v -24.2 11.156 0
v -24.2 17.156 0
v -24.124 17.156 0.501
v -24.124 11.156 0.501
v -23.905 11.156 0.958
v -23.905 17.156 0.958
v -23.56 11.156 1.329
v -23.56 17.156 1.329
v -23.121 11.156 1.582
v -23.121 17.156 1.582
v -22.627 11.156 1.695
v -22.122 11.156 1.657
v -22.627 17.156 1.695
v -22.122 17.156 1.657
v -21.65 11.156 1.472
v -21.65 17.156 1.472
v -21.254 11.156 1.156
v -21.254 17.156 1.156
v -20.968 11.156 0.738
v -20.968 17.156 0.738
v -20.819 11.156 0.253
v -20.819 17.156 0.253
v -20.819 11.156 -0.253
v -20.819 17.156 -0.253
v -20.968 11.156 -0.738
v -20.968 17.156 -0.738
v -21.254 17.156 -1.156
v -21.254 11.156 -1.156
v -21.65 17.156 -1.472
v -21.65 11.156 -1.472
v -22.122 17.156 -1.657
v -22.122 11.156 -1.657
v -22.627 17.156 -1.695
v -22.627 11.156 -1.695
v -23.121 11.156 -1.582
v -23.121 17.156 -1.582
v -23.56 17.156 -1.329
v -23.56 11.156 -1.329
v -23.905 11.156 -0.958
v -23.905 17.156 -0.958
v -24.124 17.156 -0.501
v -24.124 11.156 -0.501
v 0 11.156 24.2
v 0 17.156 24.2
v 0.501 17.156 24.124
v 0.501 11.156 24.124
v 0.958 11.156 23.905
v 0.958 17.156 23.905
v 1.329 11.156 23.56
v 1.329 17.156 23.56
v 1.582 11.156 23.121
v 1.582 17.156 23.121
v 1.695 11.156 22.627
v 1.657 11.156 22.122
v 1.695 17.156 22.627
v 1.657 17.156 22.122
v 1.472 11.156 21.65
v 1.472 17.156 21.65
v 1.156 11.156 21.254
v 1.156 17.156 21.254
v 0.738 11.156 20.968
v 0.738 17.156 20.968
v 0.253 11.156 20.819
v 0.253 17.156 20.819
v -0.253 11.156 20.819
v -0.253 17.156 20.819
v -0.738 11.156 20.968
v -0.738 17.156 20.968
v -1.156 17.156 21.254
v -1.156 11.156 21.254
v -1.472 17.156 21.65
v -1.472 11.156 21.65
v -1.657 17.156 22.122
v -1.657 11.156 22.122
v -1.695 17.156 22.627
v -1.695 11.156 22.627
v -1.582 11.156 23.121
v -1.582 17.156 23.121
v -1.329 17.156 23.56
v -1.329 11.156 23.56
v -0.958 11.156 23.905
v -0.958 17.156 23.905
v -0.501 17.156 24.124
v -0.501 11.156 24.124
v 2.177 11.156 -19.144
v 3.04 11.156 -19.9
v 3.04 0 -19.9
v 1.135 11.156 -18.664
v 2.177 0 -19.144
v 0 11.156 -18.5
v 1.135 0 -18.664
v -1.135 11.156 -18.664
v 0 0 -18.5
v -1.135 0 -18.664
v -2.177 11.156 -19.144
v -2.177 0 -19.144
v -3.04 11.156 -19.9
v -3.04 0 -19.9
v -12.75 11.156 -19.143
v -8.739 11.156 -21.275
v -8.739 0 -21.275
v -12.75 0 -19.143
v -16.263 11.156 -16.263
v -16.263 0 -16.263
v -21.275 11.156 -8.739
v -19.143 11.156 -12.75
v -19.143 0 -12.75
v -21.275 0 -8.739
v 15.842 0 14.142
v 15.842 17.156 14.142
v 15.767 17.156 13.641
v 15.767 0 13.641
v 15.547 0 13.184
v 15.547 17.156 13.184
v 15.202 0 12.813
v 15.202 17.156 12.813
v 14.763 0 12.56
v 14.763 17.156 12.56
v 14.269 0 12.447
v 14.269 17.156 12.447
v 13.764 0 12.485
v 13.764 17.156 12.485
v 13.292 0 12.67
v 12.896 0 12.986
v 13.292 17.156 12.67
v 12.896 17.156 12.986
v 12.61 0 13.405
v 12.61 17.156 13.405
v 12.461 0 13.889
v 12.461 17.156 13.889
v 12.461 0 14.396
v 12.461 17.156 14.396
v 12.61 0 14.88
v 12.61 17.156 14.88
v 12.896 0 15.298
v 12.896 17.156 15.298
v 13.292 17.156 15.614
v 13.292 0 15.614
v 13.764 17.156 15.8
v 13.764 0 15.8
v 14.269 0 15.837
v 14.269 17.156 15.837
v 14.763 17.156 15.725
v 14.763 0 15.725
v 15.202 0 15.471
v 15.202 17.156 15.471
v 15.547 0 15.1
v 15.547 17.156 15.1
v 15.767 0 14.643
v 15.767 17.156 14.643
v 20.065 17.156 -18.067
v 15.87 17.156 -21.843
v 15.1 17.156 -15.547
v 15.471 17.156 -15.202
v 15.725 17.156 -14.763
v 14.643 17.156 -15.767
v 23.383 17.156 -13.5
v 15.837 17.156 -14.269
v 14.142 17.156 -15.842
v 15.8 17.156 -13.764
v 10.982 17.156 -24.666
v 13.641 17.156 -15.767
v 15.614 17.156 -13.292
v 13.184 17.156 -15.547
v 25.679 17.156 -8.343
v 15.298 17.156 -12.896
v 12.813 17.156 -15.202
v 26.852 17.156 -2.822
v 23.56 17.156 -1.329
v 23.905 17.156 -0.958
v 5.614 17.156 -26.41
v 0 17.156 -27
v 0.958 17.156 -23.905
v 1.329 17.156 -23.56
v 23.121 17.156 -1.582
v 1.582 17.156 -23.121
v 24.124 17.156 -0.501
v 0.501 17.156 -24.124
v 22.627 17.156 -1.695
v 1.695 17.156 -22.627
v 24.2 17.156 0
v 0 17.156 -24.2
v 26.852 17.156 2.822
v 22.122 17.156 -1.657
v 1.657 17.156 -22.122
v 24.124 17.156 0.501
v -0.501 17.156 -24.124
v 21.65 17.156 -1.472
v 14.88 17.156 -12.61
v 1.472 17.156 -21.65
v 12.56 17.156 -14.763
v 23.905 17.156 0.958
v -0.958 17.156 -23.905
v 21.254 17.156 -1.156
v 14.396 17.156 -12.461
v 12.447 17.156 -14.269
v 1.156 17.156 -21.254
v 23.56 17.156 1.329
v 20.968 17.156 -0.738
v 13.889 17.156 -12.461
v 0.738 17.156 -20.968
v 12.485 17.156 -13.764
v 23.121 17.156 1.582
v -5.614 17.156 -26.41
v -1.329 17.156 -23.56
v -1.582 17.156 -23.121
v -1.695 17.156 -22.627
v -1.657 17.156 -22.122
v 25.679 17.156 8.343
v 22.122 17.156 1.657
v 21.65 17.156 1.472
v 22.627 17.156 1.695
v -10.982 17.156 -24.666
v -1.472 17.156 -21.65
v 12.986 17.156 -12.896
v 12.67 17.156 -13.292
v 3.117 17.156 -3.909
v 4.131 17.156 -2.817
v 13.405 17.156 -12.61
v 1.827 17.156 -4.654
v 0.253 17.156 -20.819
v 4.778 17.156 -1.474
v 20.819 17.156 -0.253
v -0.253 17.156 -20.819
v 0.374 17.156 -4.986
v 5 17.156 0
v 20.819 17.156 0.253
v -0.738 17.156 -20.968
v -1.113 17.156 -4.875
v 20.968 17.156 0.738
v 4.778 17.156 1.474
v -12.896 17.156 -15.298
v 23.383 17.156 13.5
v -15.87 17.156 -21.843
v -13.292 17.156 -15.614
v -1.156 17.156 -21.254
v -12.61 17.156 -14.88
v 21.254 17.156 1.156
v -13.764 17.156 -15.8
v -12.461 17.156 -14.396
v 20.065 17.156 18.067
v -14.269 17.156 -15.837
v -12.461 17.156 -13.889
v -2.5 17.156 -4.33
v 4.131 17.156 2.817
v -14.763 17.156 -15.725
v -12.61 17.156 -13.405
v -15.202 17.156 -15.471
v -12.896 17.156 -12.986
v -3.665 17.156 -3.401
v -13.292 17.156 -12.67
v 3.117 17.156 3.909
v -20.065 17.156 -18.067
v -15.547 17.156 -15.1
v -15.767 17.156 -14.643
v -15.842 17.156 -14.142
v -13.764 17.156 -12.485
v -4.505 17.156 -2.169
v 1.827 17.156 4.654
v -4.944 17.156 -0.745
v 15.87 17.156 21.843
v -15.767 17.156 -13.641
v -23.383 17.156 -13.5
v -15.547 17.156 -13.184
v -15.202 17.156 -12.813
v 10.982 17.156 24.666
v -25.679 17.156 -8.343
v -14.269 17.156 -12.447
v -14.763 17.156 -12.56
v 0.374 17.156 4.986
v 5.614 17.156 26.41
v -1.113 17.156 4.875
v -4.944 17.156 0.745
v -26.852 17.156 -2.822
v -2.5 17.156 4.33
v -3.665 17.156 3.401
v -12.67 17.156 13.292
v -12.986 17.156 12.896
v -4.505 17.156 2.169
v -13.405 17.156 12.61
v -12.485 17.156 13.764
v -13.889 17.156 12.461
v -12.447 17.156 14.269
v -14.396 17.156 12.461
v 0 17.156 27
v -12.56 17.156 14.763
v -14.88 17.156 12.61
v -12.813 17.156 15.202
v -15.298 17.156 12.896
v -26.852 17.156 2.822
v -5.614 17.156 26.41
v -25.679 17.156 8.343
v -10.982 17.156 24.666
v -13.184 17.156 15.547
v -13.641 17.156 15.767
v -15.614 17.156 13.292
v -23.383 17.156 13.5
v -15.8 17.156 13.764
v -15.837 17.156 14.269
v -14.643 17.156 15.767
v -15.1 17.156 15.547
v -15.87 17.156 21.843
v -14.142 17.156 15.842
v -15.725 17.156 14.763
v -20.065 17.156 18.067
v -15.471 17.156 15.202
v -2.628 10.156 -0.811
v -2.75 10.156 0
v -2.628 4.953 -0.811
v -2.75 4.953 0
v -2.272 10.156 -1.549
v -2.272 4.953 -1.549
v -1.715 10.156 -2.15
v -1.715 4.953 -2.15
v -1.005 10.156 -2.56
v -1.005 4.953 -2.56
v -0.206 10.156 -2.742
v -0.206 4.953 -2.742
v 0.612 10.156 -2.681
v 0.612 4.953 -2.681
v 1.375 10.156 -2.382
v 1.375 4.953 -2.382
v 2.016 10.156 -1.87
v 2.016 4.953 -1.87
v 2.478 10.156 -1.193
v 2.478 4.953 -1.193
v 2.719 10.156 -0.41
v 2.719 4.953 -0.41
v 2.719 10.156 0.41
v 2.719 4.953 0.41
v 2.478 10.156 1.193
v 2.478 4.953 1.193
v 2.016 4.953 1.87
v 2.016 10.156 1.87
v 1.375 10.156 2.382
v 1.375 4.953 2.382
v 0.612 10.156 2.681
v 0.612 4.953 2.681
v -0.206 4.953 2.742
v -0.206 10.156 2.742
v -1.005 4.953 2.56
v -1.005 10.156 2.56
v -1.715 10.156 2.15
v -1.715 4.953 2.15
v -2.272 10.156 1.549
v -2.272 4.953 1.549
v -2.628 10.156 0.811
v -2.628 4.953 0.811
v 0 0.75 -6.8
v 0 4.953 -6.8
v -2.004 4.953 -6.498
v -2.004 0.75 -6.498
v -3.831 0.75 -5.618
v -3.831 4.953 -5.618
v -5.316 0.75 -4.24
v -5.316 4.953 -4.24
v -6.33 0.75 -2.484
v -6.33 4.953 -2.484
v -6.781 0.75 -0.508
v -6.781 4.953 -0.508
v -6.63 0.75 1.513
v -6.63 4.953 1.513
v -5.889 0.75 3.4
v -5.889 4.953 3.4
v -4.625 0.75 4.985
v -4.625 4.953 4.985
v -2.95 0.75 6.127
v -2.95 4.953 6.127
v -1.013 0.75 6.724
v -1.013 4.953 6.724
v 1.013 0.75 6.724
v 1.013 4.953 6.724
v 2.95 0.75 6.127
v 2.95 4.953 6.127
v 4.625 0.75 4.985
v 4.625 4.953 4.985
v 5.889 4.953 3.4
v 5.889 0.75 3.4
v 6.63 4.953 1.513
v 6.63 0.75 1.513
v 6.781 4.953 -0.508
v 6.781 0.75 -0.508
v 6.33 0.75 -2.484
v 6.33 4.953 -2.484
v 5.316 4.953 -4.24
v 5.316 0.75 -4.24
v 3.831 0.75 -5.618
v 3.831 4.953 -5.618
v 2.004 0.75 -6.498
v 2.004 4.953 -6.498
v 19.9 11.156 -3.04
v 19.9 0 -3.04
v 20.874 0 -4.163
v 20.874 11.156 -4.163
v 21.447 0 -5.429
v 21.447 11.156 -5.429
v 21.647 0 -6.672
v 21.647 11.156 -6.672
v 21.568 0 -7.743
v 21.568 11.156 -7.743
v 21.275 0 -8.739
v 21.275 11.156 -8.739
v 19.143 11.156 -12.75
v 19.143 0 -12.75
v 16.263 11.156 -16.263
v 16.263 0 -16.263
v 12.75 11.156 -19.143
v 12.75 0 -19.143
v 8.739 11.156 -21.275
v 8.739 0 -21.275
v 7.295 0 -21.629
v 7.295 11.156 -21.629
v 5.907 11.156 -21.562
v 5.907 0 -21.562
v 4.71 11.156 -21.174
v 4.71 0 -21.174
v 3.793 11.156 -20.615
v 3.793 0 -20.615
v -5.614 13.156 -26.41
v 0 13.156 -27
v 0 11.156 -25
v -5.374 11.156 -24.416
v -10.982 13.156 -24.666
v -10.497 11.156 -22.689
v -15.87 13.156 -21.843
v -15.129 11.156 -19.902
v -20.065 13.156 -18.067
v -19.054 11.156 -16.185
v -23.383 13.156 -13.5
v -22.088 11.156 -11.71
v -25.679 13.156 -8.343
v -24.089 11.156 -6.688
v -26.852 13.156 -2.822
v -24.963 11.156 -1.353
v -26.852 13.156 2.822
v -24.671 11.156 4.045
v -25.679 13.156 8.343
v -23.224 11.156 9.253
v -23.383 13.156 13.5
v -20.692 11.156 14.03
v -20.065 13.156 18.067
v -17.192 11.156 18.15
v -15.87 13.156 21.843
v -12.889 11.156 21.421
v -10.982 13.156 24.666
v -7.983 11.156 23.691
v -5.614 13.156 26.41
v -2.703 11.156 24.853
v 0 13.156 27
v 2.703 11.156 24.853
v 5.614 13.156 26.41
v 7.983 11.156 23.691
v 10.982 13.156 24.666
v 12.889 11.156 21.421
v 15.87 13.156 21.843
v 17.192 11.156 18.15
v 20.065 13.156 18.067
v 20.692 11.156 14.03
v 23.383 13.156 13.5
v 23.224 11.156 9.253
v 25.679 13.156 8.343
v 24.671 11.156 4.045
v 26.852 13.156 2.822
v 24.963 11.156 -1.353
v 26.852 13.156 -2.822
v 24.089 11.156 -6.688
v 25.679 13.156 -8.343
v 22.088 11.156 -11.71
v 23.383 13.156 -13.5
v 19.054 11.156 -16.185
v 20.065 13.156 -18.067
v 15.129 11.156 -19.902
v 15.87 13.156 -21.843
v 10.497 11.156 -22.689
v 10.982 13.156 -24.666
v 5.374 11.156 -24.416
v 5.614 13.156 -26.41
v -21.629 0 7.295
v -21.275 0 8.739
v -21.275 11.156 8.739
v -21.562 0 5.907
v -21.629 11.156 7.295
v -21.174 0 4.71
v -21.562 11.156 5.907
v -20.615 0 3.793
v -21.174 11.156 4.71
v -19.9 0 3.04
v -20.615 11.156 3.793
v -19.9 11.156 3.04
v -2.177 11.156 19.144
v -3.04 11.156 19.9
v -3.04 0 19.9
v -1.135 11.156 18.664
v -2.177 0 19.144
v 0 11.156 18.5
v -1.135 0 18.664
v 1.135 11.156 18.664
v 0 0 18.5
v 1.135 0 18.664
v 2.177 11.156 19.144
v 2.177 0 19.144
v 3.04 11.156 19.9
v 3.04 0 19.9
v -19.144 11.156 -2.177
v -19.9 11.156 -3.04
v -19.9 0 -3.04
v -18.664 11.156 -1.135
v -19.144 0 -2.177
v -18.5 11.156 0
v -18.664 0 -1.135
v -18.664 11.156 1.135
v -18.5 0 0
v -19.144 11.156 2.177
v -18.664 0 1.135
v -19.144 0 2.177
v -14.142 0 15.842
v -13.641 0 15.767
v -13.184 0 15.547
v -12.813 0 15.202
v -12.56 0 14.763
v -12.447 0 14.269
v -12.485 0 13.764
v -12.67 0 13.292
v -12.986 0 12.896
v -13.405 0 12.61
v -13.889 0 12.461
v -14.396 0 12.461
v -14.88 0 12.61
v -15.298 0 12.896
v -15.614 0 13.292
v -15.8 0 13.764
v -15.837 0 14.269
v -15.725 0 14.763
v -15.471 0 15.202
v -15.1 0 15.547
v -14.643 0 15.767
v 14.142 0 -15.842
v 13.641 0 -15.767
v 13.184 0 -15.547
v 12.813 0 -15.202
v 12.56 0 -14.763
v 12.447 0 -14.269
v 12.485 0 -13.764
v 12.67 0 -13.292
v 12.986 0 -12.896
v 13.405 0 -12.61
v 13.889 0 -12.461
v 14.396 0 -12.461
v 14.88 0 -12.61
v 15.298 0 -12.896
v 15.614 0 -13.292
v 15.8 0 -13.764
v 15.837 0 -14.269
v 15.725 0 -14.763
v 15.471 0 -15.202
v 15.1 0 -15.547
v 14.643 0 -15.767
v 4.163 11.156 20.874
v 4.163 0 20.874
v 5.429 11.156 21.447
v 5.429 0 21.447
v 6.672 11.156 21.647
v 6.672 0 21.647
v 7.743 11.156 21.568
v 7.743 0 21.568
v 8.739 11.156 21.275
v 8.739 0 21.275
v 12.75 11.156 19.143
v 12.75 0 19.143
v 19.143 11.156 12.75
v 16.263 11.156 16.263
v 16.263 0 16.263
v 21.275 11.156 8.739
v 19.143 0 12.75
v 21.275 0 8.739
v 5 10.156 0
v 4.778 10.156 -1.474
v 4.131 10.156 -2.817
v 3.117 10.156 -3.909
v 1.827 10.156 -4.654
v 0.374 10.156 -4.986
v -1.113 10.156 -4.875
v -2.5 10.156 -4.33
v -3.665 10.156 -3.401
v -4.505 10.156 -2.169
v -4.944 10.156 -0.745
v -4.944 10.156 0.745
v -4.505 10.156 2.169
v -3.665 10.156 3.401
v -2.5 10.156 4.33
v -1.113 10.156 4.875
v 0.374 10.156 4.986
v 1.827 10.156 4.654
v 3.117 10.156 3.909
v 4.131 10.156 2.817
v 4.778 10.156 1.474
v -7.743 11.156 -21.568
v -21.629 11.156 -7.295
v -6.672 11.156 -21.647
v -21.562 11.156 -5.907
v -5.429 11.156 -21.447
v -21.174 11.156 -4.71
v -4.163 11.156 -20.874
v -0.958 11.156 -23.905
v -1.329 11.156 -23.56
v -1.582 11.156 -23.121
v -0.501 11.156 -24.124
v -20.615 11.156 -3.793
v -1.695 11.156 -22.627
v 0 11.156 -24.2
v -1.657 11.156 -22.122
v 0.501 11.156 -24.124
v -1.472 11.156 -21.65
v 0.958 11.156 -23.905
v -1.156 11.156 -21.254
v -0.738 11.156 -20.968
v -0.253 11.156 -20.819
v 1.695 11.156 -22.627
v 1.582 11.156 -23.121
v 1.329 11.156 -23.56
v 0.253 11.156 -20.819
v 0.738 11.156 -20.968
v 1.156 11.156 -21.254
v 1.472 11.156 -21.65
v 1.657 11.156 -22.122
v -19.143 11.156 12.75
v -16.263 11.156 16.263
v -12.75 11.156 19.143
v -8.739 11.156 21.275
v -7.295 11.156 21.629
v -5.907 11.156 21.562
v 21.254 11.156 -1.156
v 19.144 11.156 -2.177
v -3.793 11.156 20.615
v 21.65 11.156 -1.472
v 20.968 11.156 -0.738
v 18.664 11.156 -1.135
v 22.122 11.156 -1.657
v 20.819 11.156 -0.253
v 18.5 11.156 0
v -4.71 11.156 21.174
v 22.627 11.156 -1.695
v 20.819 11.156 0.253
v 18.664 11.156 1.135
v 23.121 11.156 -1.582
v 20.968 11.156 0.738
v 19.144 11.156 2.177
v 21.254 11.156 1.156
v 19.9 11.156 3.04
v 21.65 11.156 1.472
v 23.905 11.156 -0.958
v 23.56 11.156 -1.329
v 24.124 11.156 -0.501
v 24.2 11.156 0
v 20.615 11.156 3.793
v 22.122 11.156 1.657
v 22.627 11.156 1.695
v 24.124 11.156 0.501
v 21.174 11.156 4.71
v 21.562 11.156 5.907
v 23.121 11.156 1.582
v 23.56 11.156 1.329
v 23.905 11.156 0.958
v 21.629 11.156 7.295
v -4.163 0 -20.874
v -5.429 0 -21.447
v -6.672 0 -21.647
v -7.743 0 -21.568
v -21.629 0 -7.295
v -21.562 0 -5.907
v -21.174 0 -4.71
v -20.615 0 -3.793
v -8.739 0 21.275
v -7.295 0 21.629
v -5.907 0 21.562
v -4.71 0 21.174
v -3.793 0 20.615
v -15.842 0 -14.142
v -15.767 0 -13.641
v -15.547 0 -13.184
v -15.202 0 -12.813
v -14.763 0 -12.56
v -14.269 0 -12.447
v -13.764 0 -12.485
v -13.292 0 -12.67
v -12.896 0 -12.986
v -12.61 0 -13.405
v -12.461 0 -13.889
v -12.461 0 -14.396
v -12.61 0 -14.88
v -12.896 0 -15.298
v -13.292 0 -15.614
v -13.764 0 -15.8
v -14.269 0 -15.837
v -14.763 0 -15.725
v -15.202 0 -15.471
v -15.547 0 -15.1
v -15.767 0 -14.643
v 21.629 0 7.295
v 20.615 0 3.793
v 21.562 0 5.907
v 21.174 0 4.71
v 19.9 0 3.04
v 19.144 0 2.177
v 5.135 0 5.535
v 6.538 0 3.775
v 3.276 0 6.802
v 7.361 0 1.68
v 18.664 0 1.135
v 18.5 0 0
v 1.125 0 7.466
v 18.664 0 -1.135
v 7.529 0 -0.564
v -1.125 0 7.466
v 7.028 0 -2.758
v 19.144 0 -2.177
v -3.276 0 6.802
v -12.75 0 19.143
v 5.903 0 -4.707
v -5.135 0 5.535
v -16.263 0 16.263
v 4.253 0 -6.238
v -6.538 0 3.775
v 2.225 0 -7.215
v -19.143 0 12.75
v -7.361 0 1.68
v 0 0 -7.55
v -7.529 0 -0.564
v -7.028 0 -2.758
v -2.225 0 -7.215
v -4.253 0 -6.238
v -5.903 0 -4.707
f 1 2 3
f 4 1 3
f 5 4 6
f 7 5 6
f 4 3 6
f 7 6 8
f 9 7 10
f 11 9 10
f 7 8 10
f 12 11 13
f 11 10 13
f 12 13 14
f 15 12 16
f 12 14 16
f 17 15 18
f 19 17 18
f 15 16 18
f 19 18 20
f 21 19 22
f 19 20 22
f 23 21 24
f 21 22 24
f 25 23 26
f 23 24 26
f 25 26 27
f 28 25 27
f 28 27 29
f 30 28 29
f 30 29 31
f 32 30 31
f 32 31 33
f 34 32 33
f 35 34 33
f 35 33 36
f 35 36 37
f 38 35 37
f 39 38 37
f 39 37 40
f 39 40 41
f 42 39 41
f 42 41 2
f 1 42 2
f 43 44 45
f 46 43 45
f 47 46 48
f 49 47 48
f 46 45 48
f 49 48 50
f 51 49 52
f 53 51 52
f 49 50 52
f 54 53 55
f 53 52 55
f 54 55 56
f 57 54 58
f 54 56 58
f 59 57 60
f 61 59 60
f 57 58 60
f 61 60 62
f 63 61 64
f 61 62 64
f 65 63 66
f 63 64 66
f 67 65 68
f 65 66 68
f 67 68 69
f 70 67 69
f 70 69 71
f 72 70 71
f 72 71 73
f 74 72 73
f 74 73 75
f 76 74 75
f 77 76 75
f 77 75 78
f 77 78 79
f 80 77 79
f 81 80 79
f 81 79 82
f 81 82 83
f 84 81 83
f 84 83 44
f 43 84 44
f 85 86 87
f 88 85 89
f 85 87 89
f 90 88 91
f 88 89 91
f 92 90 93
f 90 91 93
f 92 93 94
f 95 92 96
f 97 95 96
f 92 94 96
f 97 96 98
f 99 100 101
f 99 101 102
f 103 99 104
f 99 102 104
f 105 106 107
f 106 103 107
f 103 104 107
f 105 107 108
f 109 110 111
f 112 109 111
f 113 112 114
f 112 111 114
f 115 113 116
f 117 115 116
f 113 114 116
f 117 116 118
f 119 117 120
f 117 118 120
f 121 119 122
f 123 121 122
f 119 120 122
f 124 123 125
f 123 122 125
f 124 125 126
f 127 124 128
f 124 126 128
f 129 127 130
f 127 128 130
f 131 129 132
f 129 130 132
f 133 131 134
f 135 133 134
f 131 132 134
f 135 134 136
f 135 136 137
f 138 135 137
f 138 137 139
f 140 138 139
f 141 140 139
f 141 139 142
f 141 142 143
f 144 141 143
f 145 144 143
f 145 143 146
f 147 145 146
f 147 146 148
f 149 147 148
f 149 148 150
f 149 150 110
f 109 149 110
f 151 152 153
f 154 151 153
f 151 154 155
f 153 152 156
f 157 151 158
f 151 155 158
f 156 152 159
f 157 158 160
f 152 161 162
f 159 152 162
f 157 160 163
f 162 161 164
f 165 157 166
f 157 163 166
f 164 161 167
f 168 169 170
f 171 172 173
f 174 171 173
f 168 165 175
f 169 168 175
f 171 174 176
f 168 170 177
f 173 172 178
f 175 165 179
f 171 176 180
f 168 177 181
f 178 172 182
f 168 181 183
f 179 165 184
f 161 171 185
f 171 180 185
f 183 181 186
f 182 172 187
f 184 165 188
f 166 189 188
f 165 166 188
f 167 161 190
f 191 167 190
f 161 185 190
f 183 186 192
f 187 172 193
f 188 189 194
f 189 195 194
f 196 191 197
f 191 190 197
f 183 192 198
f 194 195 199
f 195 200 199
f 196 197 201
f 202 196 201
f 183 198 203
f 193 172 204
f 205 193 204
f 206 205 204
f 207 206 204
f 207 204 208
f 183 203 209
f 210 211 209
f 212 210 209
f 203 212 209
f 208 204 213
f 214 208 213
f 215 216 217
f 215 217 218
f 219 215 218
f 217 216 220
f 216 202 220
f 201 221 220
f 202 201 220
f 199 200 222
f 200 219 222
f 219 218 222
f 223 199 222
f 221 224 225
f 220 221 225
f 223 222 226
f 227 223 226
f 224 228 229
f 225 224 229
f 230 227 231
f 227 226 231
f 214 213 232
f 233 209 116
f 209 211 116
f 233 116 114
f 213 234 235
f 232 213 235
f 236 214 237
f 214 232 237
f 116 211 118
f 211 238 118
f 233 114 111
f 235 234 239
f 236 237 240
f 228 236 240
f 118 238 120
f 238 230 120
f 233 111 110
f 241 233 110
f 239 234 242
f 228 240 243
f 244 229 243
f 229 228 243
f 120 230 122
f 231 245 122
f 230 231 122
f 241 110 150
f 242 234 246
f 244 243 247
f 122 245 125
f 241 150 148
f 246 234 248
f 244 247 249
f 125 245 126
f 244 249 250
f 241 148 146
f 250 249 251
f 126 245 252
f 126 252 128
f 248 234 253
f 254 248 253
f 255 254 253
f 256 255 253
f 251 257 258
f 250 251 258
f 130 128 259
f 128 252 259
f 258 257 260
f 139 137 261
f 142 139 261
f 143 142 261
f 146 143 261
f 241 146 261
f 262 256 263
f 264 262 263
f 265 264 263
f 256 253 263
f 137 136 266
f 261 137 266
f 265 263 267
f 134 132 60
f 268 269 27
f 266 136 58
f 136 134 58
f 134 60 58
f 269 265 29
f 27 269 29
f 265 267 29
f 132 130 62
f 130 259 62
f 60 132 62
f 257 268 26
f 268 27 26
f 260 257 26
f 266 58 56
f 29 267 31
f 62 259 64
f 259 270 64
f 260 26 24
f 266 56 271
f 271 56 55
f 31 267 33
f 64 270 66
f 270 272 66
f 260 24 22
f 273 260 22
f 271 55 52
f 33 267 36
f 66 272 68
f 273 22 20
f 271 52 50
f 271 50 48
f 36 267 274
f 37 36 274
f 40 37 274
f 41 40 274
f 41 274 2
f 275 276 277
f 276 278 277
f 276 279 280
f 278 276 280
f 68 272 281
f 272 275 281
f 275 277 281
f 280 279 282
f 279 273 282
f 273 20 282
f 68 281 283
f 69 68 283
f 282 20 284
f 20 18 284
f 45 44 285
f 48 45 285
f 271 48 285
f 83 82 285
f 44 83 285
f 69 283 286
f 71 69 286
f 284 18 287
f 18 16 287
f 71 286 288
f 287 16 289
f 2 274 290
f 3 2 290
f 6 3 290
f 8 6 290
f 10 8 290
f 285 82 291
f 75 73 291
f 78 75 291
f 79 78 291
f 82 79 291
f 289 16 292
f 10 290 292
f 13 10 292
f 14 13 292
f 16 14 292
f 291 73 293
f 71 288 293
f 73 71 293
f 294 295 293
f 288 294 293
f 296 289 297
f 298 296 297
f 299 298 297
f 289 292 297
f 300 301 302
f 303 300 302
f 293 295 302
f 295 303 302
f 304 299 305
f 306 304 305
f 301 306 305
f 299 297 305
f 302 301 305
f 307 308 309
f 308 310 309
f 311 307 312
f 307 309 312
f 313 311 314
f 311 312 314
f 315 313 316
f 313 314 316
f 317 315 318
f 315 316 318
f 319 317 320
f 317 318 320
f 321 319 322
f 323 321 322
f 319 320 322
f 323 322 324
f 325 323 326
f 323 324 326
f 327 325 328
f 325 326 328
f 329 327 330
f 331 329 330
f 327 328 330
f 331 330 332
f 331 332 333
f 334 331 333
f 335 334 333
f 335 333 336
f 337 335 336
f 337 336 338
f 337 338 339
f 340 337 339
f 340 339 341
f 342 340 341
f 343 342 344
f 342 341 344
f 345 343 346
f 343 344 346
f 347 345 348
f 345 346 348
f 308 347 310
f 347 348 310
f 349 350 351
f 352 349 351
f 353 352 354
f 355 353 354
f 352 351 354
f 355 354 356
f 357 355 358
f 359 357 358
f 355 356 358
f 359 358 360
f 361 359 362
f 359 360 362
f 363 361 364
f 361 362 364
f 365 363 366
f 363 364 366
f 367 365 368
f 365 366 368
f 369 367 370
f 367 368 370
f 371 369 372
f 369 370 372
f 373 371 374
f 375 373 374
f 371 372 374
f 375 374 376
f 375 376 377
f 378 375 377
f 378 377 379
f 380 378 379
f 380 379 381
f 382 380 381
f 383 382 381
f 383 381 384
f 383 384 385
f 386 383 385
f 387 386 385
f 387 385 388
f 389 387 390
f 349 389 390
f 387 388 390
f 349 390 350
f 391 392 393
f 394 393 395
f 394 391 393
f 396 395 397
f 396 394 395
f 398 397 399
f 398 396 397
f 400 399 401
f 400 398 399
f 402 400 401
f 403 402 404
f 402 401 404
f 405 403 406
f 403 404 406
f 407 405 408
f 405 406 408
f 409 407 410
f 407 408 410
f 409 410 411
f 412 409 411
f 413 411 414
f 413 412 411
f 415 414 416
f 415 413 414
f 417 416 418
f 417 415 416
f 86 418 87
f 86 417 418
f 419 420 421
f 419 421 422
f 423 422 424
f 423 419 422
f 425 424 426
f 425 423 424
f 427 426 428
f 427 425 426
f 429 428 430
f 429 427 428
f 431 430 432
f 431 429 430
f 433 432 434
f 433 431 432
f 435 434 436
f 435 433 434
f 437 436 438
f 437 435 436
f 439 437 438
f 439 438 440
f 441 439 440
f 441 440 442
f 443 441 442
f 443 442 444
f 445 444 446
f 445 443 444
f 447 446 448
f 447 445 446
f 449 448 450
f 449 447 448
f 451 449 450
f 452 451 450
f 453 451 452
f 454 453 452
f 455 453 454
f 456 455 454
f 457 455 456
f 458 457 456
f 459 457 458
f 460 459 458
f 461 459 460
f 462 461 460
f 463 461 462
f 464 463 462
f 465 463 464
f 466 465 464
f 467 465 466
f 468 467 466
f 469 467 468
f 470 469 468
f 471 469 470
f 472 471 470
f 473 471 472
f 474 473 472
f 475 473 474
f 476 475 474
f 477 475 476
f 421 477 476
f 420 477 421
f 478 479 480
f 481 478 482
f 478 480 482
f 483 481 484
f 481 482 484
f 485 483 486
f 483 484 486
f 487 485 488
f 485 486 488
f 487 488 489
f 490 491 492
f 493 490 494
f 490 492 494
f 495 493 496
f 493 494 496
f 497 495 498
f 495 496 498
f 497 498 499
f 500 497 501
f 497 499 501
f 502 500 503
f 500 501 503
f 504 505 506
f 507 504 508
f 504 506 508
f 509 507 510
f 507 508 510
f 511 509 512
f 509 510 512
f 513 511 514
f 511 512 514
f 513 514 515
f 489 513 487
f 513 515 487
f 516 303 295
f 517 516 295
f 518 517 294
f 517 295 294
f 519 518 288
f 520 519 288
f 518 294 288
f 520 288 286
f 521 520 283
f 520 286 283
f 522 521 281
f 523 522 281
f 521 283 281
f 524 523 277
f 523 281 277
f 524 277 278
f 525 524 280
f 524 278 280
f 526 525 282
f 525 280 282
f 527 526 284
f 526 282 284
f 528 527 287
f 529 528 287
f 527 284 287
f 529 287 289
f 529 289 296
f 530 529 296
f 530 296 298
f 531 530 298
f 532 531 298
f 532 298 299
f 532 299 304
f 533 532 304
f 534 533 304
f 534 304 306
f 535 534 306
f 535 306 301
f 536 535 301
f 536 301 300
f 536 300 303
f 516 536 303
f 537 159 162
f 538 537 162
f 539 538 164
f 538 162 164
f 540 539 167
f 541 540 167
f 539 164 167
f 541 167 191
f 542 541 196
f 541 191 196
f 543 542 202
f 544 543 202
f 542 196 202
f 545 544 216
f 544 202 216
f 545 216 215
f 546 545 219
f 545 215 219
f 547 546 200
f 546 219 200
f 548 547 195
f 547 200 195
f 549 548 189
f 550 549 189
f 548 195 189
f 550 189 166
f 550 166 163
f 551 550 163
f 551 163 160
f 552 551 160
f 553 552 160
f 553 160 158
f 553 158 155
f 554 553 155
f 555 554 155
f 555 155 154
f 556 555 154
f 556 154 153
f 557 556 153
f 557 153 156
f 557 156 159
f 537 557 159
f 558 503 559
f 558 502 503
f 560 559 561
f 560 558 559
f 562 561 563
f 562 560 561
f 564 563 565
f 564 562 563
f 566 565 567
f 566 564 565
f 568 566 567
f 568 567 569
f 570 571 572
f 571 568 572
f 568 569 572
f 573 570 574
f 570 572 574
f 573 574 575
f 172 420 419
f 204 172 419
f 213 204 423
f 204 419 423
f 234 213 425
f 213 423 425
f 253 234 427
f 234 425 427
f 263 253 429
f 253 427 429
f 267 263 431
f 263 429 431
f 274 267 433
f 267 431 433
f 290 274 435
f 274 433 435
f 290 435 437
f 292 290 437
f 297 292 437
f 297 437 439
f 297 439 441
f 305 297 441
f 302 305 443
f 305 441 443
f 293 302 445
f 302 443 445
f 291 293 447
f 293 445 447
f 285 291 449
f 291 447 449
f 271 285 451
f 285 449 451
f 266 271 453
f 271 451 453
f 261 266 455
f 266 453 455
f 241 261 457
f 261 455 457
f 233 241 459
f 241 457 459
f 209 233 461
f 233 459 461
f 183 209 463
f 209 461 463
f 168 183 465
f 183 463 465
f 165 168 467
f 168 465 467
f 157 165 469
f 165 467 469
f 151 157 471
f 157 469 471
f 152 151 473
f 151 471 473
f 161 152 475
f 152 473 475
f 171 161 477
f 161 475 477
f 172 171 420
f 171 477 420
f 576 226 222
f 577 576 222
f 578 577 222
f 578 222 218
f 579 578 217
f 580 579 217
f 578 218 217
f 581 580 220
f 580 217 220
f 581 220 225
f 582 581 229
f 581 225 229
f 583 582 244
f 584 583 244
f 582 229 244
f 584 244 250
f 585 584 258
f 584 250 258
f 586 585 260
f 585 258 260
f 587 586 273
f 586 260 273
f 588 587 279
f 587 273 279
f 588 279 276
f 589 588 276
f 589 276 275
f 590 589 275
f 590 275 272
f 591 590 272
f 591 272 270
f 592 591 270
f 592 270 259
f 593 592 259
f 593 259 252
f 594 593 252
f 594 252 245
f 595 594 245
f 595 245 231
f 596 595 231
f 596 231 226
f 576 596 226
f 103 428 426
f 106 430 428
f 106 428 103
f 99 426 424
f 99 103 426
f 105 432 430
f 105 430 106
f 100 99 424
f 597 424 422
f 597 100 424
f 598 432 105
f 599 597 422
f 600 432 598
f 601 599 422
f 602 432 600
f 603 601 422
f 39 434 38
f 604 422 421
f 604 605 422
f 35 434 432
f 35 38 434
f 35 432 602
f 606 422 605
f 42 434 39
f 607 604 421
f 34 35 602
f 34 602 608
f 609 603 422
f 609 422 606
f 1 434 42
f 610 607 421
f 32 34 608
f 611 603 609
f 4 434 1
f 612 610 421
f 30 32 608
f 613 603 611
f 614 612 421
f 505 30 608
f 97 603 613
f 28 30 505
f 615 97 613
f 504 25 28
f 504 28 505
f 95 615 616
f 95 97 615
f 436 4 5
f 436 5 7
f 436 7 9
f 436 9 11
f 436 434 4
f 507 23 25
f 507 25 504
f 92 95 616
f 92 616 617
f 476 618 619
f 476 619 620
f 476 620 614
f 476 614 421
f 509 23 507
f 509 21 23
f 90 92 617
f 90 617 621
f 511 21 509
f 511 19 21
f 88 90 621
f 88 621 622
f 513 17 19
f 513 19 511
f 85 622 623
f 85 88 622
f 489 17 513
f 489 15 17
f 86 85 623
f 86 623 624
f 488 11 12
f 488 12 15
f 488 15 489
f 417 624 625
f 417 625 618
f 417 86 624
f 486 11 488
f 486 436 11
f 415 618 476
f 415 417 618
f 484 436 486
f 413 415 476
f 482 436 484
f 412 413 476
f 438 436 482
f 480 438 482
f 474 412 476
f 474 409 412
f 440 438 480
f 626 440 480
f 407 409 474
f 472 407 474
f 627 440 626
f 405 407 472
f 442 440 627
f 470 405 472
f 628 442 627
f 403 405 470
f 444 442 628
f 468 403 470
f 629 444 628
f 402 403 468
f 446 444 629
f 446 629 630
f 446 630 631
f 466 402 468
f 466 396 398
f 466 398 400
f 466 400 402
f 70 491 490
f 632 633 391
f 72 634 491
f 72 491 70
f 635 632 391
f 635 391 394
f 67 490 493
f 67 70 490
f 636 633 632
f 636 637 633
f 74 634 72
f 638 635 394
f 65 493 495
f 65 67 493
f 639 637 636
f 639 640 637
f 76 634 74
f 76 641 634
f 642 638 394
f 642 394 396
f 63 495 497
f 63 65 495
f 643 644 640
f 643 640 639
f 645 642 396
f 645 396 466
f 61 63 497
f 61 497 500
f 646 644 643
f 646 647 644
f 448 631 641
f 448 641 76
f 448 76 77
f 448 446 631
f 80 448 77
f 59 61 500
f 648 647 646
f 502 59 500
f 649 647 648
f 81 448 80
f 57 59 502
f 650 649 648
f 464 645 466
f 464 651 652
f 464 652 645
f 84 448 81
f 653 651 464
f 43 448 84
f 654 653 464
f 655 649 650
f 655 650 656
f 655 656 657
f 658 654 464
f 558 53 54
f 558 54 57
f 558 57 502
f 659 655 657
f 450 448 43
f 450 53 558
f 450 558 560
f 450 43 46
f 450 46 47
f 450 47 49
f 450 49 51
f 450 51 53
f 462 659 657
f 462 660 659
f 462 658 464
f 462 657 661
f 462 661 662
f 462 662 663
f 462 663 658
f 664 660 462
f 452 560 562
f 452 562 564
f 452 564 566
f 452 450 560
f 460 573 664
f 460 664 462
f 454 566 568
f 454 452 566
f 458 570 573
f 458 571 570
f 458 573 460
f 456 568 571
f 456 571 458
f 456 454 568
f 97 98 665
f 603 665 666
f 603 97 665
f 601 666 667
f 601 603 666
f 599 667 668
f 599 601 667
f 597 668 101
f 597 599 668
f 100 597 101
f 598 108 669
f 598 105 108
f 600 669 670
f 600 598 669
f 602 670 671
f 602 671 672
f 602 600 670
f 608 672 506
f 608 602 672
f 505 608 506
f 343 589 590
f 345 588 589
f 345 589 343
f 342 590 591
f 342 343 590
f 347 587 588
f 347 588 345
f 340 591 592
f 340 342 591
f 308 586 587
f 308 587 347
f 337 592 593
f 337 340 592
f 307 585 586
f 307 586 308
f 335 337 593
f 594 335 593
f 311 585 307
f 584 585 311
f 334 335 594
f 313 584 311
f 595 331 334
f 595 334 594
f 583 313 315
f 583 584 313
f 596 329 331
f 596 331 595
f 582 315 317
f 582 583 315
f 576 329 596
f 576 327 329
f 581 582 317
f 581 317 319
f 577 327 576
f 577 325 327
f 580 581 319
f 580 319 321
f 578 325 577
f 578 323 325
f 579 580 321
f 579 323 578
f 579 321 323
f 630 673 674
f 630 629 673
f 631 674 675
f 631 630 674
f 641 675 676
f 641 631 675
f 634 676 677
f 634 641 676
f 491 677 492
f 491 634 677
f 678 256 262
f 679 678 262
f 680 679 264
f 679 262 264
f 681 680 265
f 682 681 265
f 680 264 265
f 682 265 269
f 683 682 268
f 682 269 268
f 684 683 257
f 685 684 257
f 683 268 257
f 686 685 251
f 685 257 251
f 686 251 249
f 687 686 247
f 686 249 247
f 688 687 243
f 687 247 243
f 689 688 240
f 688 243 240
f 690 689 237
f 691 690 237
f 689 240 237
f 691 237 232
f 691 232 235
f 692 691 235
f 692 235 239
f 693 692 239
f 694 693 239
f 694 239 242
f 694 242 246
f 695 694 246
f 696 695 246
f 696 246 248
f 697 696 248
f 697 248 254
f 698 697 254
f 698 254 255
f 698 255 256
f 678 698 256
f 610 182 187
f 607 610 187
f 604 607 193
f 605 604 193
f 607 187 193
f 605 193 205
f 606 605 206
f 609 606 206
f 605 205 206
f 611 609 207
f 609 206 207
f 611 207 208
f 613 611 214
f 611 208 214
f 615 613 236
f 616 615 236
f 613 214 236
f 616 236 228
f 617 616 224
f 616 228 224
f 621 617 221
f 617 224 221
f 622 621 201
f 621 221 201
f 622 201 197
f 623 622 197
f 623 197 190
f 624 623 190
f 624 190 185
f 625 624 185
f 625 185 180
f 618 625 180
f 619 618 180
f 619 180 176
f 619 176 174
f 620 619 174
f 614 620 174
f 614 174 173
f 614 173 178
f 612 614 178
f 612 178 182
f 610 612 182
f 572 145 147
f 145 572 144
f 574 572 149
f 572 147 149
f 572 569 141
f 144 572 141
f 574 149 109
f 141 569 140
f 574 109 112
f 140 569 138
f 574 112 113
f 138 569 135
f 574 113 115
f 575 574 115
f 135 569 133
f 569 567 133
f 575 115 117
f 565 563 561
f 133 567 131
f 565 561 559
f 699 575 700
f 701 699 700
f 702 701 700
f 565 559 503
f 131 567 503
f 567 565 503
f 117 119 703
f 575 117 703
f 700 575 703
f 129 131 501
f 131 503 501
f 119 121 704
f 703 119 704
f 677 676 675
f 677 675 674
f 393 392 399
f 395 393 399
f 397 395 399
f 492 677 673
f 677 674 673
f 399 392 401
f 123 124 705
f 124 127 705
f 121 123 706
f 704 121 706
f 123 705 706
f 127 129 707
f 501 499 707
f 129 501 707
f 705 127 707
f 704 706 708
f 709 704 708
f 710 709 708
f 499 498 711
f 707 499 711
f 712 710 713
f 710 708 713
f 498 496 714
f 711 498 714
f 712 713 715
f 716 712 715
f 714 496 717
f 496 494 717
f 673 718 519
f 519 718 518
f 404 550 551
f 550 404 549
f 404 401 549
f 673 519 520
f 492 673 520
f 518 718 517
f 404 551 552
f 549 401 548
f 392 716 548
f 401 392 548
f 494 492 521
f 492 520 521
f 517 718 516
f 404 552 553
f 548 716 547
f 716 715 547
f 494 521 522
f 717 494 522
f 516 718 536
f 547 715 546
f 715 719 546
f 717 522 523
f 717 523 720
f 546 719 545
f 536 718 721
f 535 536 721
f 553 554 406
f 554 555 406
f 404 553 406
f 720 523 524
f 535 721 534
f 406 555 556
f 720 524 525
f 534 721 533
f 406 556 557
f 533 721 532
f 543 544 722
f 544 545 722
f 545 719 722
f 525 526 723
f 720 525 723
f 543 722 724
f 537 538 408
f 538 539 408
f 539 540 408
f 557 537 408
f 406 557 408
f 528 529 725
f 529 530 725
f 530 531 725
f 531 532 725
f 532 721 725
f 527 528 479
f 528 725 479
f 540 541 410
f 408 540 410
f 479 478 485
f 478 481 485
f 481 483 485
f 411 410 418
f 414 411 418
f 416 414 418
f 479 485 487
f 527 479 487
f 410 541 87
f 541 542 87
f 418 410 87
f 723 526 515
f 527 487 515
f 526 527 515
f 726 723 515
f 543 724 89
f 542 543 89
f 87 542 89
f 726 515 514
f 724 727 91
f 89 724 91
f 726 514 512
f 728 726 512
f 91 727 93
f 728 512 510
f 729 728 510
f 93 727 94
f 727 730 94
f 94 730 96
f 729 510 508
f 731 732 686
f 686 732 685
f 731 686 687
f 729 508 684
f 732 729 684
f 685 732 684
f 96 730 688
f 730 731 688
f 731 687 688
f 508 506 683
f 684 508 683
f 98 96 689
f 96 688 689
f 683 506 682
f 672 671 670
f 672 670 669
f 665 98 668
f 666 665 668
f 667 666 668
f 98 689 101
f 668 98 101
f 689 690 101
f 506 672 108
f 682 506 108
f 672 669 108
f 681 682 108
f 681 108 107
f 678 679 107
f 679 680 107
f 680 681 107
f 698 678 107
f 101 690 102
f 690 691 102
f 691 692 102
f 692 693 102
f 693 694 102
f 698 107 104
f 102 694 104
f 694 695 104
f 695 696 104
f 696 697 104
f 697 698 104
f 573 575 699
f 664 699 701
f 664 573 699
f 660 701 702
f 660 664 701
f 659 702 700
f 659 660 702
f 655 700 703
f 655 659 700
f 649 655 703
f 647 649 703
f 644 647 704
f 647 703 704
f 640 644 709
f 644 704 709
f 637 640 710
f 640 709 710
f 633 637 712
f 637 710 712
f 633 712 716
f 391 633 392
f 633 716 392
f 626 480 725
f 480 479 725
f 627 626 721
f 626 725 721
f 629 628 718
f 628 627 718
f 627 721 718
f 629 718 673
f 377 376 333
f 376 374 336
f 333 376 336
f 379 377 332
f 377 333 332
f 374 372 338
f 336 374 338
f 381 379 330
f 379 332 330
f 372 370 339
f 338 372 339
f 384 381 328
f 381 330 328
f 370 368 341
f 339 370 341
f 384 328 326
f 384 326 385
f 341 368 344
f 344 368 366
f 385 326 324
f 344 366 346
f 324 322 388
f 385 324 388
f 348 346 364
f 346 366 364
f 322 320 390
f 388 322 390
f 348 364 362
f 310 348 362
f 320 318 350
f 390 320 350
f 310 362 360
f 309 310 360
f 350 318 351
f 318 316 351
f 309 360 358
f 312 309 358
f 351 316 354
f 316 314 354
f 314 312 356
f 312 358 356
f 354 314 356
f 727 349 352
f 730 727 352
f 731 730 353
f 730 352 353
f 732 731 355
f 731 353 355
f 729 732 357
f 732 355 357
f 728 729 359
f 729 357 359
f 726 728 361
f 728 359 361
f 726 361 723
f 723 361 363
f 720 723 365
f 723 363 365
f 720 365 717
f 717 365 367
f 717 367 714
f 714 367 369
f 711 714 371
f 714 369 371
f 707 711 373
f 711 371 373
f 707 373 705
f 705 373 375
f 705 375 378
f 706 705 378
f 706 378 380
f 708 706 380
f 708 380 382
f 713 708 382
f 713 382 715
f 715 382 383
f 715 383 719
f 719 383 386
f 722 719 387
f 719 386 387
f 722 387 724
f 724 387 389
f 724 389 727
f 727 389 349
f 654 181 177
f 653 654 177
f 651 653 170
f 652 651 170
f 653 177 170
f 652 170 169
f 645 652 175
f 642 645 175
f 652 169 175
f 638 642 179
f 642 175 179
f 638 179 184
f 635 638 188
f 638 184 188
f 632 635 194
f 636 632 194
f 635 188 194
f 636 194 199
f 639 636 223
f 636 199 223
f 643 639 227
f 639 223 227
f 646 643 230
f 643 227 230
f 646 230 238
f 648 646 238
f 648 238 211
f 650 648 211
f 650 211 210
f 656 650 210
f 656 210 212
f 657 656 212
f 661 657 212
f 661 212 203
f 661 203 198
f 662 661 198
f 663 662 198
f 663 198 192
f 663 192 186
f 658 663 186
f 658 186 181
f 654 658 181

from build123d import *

# Parameters (mm, degrees)
M3_CLEARANCE_HOLE1_D           = 3.4
CUT_EXTRUDE1_DEPTH             = 11.156
FILLET1_R                      = 5
CIRPATTERN1_COUNT              = 4
FILLET1_OF_CIRPATTERN1_R       = 5
CBORE_FOR_M5_SHCS1_D           = 5.5
CBORE_FOR_M5_SHCS1_CBORE_D     = 10
CBORE_FOR_M5_SHCS1_CBORE_DEPTH = 7
CHAMFER1_SIZE                  = 0.75
CHAMFER2_SIZE                  = 2


with BuildPart() as part:
    # Sketch1 → Revolve1 (revolve)
    with BuildSketch(Plane.XY, mode=Mode.PRIVATE) as revolve1_sk:
        Polygon((6.8, 0), (6.8, 4.953), (0, 4.953), (0, 17.156), (27, 17.156), (27, 11.156), (23, 11.156), (23, 0), align=None)
    revolve(revolve1_sk.sketch.rotate(Axis((0, 0, 0), (0, 1, 0)), 90), axis=Axis((0, 0, 0), (0, 1, 0)))

    # M3 Clearance Hole1 (through all)
    with Locations(Plane.XZ):
        with Locations((-14.142135624, -14.142135624), (-22.5, 0)):
            m3_clearance_hole1 = Hole(M3_CLEARANCE_HOLE1_D / 2)

    # Sketch5 → Cut-Extrude1 (cut)
    with BuildSketch(Plane.XZ):
        with BuildLine():
            ThreePointArc((-22.65, -3.997186511), (-18.5, 0), (-22.65, 3.997186511))
            ThreePointArc((-22.65, 3.997186511), (-23, 0), (-22.65, -3.997186511))
        make_face()
    cut_extrude1 = extrude(amount=-CUT_EXTRUDE1_DEPTH, mode=Mode.SUBTRACT)

    # Fillet1
    fillet1_edges = [part.edges().sort_by_distance(p)[0] for p in [
        (-22.65, 5.578, -3.997186511),
        (-22.65, 5.578, 3.997186511),
    ]]
    fillet(fillet1_edges, radius=FILLET1_R)

    # CirPattern1: M3 Clearance Hole1, Cut-Extrude1 ×4 about axis
    cirpattern1_axis = Axis((0, 0, 0), (0, 1, 0))
    add([m3_clearance_hole1.rotate(cirpattern1_axis, i * 360 / CIRPATTERN1_COUNT) for i in range(1, CIRPATTERN1_COUNT)], mode=Mode.SUBTRACT)
    add([cut_extrude1.rotate(cirpattern1_axis, i * 360 / CIRPATTERN1_COUNT) for i in range(1, CIRPATTERN1_COUNT)], mode=Mode.SUBTRACT)

    # Fillet1 of CirPattern1
    fillet1_of_cirpattern1_edges = [part.edges().sort_by_distance(p)[0] for p in [
        (-3.997186511, 5.578, 22.65),
        (3.997186511, 5.578, 22.65),
        (22.65, 5.578, 3.997186511),
        (22.65, 5.578, -3.997186511),
        (3.997186511, 5.578, -22.65),
        (-3.997186511, 5.578, -22.65),
    ]]
    fillet(fillet1_of_cirpattern1_edges, radius=FILLET1_OF_CIRPATTERN1_R)

    # CBORE for M5 SHCS1 (through all)
    with Locations(Plane(origin=(0, 17.156, 0), x_dir=(1, 0, 0), z_dir=(0, 1, 0))):
        with Locations((0, 0)):
            CounterBoreHole(CBORE_FOR_M5_SHCS1_D / 2, CBORE_FOR_M5_SHCS1_CBORE_D / 2, CBORE_FOR_M5_SHCS1_CBORE_DEPTH)

    # Chamfer1
    chamfer1_edges = [part.edges().sort_by_distance(p)[0] for p in [
        (0, 0, 6.8),
    ]]
    chamfer(chamfer1_edges, length=CHAMFER1_SIZE)

    # Chamfer2
    chamfer2_edges = [part.edges().sort_by_distance(p)[0] for p in [
        (0, 11.156, 27),
    ]]
    chamfer(chamfer2_edges, length=CHAMFER2_SIZE)


solid = part.part
